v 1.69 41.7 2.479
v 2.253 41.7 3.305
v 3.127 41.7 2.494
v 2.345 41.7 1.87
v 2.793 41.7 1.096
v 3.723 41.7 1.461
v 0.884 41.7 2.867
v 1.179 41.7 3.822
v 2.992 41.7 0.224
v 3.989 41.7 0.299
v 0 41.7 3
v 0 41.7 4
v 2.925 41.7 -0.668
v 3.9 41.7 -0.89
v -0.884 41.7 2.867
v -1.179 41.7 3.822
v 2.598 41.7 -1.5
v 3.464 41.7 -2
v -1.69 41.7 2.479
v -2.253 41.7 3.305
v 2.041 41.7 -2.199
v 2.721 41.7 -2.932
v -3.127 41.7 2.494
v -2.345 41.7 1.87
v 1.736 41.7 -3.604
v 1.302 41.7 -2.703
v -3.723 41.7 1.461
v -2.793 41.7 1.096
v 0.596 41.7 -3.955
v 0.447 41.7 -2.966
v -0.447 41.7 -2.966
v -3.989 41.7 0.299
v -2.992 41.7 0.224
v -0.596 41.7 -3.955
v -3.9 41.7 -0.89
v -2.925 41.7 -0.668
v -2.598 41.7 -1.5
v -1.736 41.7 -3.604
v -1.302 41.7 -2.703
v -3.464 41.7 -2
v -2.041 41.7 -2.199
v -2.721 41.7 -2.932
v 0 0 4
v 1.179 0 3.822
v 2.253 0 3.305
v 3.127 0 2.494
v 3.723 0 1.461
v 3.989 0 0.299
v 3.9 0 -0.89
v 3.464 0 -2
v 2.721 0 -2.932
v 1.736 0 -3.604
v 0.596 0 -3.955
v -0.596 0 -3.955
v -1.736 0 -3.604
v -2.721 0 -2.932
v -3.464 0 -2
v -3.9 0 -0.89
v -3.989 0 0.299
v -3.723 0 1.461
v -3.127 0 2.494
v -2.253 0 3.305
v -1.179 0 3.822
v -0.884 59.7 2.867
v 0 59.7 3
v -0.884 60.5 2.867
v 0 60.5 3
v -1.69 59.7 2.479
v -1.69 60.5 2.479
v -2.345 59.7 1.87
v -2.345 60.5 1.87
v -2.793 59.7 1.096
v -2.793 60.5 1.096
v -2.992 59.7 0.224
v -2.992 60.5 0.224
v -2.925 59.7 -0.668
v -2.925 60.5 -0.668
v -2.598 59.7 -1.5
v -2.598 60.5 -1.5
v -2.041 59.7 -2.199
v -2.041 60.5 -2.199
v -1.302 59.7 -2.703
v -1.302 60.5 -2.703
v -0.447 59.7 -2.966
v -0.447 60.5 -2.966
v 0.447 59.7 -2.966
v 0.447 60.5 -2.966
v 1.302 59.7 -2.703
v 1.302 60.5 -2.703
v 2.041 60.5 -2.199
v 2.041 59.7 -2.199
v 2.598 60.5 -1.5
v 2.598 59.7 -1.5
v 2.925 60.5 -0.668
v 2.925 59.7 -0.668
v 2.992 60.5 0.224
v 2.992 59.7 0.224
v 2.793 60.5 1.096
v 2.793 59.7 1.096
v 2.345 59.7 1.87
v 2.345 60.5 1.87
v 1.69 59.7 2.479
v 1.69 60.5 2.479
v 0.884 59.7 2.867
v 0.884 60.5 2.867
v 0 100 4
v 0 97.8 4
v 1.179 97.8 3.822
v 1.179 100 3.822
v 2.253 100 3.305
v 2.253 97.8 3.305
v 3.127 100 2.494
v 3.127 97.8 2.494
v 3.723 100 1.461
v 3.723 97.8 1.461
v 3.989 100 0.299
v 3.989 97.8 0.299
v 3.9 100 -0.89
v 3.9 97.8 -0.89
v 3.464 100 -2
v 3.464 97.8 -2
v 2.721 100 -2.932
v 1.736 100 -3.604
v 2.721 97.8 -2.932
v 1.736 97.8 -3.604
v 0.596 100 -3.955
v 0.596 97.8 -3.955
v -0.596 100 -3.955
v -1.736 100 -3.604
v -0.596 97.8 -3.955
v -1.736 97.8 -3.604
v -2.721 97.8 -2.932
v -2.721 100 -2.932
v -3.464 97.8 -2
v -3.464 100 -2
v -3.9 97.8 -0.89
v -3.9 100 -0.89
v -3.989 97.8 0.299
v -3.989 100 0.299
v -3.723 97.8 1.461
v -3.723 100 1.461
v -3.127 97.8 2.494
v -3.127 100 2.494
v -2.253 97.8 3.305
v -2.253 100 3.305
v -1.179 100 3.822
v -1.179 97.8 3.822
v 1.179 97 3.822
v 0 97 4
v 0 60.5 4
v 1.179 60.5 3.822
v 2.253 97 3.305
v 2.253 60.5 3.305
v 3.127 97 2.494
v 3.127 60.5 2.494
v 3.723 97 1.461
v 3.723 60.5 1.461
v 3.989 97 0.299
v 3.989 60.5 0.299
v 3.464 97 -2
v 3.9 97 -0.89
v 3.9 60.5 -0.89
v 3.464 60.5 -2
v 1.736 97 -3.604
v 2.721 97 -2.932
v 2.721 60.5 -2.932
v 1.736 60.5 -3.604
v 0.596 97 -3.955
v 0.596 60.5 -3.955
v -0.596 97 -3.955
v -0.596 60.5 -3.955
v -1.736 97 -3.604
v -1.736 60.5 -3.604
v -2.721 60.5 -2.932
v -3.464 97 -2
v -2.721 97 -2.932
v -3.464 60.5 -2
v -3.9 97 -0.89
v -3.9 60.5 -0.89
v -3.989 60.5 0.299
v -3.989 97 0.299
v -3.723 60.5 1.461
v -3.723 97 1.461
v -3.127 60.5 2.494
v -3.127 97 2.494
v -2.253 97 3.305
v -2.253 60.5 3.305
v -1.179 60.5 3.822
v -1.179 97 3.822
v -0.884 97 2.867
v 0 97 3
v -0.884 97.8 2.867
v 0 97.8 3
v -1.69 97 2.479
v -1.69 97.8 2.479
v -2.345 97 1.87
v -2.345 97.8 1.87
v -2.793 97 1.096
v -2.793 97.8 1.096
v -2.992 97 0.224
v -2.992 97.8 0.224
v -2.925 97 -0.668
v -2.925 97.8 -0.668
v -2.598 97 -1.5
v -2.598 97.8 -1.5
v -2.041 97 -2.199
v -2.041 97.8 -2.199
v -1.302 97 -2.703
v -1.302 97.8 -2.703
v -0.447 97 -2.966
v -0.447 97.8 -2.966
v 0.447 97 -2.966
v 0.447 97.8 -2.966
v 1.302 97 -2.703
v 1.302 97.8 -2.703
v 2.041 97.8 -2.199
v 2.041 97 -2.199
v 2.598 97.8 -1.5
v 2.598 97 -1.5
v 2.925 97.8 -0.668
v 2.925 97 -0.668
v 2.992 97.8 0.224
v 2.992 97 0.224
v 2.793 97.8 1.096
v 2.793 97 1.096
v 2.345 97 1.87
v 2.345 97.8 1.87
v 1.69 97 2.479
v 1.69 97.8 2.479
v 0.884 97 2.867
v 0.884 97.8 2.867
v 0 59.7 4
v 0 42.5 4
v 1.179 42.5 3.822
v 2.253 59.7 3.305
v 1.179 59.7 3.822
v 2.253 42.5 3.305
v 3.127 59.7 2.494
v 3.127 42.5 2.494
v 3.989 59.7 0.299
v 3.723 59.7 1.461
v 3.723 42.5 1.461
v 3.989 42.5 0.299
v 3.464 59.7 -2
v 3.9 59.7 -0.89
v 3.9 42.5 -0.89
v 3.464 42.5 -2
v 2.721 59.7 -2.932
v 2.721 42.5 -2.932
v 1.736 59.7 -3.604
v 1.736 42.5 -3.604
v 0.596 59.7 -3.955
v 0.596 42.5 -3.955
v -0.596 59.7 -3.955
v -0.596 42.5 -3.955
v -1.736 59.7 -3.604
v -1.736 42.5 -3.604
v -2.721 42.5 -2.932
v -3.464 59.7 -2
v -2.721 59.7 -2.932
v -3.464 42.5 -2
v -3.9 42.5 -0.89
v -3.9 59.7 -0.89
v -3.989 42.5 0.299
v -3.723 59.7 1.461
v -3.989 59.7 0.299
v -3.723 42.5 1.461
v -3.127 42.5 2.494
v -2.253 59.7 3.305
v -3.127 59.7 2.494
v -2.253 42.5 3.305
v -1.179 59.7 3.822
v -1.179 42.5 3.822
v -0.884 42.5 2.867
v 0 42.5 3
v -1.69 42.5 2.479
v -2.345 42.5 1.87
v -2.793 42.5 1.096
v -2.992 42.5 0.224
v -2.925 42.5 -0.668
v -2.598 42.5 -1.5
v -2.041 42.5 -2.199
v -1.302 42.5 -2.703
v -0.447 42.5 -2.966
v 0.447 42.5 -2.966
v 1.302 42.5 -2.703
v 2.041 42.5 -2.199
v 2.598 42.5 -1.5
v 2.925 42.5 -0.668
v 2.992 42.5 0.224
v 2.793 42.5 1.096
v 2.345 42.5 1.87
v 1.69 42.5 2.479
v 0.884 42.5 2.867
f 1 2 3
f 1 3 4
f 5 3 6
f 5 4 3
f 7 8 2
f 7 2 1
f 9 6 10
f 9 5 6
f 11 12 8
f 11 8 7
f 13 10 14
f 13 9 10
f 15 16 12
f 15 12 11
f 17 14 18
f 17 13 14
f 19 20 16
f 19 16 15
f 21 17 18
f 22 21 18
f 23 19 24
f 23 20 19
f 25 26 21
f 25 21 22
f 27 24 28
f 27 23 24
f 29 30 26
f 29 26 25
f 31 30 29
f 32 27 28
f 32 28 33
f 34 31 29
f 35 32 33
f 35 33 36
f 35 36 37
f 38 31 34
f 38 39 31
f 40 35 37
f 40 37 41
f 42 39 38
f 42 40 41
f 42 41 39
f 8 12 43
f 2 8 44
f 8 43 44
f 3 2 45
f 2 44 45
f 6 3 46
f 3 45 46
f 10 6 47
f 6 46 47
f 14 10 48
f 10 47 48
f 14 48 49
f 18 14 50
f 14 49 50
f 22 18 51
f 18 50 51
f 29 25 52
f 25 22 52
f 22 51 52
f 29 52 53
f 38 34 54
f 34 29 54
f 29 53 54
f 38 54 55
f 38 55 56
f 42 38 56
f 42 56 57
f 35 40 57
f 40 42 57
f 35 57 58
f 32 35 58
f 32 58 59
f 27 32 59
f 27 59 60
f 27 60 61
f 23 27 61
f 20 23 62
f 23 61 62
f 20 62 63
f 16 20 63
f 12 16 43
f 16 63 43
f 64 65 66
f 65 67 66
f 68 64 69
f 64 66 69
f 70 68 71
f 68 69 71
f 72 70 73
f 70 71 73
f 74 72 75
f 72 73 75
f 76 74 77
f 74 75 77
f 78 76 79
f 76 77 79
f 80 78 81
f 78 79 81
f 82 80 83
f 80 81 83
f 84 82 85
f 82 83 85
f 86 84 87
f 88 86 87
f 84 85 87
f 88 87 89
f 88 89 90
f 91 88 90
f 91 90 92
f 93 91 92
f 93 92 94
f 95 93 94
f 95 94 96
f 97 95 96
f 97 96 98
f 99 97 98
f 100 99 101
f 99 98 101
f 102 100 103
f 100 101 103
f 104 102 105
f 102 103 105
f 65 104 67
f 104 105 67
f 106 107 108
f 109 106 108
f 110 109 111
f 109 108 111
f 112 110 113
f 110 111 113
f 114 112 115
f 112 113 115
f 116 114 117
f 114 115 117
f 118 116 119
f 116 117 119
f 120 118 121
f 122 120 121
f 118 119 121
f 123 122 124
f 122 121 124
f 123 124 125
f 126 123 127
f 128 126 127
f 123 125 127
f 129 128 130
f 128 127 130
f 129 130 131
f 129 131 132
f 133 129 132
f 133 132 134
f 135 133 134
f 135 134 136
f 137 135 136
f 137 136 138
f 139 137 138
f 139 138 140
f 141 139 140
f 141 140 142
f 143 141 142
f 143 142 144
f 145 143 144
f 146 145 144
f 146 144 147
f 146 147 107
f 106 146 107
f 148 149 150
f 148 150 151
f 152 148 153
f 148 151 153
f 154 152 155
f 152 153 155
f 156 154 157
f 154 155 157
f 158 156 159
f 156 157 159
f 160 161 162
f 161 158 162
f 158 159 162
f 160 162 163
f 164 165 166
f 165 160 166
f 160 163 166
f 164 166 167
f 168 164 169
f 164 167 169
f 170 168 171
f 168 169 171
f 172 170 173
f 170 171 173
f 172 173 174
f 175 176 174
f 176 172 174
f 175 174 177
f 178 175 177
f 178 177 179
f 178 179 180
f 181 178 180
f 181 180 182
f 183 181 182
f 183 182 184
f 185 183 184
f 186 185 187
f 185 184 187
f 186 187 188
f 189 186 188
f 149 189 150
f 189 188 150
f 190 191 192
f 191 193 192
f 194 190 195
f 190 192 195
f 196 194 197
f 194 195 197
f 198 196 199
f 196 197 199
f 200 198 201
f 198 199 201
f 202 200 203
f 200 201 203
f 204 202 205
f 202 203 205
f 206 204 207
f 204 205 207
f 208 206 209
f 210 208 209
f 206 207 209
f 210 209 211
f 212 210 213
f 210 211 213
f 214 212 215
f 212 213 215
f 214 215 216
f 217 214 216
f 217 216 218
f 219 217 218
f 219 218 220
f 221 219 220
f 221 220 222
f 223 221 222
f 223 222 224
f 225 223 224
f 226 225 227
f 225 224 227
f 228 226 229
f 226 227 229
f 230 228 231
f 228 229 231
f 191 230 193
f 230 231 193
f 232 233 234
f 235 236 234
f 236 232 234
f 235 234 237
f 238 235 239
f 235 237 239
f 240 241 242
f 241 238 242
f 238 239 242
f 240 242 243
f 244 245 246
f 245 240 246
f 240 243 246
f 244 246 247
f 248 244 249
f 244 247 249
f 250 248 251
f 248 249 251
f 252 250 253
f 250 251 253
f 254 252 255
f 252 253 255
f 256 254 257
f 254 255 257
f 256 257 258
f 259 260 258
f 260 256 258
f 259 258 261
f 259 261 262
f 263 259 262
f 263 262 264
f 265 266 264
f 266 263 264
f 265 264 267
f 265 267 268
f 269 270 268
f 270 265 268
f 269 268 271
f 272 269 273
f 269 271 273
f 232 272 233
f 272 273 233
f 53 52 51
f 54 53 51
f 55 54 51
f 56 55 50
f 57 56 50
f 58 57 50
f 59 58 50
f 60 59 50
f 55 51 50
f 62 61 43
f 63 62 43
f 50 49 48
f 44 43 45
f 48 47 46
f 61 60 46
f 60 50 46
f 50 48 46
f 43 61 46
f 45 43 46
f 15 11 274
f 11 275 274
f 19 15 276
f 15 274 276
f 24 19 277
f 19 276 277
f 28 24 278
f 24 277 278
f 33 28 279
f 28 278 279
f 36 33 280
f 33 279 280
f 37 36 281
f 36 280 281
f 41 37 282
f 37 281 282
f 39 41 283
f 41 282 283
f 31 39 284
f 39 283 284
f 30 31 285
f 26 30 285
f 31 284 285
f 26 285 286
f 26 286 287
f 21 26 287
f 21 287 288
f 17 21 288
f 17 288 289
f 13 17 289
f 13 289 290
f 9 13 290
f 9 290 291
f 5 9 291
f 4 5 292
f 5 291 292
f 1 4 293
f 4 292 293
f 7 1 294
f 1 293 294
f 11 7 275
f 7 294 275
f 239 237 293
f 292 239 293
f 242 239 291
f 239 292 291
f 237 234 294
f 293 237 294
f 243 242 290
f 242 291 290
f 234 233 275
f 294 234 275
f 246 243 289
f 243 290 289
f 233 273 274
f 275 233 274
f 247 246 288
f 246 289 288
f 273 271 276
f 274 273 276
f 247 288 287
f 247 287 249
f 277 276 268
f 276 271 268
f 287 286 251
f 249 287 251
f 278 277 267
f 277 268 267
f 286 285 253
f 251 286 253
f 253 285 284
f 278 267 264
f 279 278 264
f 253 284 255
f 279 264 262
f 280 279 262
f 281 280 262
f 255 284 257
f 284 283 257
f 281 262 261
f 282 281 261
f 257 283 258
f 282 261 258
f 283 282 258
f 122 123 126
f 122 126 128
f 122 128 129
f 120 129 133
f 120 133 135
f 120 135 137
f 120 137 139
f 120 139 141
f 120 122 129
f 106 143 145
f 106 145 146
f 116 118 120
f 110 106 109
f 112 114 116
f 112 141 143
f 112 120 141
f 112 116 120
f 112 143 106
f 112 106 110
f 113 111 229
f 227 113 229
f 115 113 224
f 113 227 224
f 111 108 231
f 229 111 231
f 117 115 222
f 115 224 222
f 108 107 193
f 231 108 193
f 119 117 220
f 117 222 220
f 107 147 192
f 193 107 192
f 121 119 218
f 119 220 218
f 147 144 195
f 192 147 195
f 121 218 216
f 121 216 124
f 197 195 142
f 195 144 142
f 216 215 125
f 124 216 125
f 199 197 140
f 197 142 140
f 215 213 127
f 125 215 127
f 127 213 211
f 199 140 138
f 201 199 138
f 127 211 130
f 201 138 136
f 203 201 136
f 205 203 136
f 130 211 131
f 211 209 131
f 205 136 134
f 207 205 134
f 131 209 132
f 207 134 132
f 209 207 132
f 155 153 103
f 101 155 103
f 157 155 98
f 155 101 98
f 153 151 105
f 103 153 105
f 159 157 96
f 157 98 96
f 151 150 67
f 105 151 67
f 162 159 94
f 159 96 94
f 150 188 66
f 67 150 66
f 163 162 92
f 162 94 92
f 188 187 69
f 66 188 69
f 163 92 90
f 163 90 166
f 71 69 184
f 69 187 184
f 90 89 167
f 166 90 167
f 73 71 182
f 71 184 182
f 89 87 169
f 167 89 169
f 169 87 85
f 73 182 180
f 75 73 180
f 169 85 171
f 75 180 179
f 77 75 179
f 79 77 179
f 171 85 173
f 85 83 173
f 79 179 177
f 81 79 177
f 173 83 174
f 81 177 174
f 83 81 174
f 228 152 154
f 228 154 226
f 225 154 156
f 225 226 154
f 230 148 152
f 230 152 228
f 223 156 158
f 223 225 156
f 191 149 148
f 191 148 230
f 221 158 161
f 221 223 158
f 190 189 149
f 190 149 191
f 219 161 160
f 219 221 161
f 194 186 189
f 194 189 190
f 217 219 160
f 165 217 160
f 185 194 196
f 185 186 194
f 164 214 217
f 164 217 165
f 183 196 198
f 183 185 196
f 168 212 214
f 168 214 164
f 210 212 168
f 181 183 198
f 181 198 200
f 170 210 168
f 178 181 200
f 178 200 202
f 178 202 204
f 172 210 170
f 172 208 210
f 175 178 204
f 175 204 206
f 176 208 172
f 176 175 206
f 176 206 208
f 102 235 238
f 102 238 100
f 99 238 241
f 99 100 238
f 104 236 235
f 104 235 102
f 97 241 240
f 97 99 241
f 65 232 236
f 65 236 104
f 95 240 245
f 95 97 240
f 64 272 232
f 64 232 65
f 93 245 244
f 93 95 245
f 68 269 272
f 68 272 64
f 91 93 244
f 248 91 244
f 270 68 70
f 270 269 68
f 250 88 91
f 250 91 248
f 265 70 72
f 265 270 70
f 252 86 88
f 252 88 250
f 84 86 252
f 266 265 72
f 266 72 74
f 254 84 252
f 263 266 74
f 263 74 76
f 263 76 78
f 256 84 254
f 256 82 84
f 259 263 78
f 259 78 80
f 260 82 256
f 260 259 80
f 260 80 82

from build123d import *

# Parameters (mm, degrees)
SKETCH1_R           = 4
BOSS_EXTRUDE1_DEPTH = 100
SKETCH2_W           = 1
SKETCH2_H           = 0.8
SKETCH3_W           = 1
SKETCH3_H           = 0.8
LPATTERN1_COUNT     = 2
LPATTERN1_PITCH     = 18


with BuildPart() as part:
    # Sketch1 → Boss-Extrude1 (new body)
    with BuildSketch(Plane(origin=(0, 0, 0), x_dir=(1, 0, 0), z_dir=(0, 1, 0))):
        with Locations(Location((0, 0, 0), (0, 0, 270))):
            Circle(SKETCH1_R)
    extrude(amount=BOSS_EXTRUDE1_DEPTH)

    # Sketch2 → Cut-Revolve1 (revolve, cut)
    with BuildSketch(Plane(origin=(0, 0, 0), x_dir=(0, 0, -1), z_dir=(1, 0, 0)), mode=Mode.PRIVATE) as cut_revolve1_sk:
        with Locations((3.5, 97.4)):
            Rectangle(SKETCH2_W, SKETCH2_H)
    revolve(cut_revolve1_sk.sketch.rotate(Axis((0, 100, 0), (0, -1, 0)), 180), axis=Axis((0, 100, 0), (0, -1, 0)), mode=Mode.SUBTRACT)

    # Sketch3 → Cut-Revolve2 (revolve, cut)
    with BuildSketch(Plane(origin=(0, 0, 0), x_dir=(0, 0, -1), z_dir=(1, 0, 0)), mode=Mode.PRIVATE) as cut_revolve2_sk:
        with Locations((3.5, 60.1)):
            Rectangle(SKETCH3_W, SKETCH3_H)
    cut_revolve2 = revolve(cut_revolve2_sk.sketch.rotate(Axis((0, 100, 0), (0, -1, 0)), 180), axis=Axis((0, 100, 0), (0, -1, 0)), mode=Mode.SUBTRACT)

    # LPattern1: Cut-Revolve2 ×2
    with Locations(*[(0, -i * LPATTERN1_PITCH, 0) for i in range(1, LPATTERN1_COUNT)]):
        add(cut_revolve2, mode=Mode.SUBTRACT)


solid = part.part
